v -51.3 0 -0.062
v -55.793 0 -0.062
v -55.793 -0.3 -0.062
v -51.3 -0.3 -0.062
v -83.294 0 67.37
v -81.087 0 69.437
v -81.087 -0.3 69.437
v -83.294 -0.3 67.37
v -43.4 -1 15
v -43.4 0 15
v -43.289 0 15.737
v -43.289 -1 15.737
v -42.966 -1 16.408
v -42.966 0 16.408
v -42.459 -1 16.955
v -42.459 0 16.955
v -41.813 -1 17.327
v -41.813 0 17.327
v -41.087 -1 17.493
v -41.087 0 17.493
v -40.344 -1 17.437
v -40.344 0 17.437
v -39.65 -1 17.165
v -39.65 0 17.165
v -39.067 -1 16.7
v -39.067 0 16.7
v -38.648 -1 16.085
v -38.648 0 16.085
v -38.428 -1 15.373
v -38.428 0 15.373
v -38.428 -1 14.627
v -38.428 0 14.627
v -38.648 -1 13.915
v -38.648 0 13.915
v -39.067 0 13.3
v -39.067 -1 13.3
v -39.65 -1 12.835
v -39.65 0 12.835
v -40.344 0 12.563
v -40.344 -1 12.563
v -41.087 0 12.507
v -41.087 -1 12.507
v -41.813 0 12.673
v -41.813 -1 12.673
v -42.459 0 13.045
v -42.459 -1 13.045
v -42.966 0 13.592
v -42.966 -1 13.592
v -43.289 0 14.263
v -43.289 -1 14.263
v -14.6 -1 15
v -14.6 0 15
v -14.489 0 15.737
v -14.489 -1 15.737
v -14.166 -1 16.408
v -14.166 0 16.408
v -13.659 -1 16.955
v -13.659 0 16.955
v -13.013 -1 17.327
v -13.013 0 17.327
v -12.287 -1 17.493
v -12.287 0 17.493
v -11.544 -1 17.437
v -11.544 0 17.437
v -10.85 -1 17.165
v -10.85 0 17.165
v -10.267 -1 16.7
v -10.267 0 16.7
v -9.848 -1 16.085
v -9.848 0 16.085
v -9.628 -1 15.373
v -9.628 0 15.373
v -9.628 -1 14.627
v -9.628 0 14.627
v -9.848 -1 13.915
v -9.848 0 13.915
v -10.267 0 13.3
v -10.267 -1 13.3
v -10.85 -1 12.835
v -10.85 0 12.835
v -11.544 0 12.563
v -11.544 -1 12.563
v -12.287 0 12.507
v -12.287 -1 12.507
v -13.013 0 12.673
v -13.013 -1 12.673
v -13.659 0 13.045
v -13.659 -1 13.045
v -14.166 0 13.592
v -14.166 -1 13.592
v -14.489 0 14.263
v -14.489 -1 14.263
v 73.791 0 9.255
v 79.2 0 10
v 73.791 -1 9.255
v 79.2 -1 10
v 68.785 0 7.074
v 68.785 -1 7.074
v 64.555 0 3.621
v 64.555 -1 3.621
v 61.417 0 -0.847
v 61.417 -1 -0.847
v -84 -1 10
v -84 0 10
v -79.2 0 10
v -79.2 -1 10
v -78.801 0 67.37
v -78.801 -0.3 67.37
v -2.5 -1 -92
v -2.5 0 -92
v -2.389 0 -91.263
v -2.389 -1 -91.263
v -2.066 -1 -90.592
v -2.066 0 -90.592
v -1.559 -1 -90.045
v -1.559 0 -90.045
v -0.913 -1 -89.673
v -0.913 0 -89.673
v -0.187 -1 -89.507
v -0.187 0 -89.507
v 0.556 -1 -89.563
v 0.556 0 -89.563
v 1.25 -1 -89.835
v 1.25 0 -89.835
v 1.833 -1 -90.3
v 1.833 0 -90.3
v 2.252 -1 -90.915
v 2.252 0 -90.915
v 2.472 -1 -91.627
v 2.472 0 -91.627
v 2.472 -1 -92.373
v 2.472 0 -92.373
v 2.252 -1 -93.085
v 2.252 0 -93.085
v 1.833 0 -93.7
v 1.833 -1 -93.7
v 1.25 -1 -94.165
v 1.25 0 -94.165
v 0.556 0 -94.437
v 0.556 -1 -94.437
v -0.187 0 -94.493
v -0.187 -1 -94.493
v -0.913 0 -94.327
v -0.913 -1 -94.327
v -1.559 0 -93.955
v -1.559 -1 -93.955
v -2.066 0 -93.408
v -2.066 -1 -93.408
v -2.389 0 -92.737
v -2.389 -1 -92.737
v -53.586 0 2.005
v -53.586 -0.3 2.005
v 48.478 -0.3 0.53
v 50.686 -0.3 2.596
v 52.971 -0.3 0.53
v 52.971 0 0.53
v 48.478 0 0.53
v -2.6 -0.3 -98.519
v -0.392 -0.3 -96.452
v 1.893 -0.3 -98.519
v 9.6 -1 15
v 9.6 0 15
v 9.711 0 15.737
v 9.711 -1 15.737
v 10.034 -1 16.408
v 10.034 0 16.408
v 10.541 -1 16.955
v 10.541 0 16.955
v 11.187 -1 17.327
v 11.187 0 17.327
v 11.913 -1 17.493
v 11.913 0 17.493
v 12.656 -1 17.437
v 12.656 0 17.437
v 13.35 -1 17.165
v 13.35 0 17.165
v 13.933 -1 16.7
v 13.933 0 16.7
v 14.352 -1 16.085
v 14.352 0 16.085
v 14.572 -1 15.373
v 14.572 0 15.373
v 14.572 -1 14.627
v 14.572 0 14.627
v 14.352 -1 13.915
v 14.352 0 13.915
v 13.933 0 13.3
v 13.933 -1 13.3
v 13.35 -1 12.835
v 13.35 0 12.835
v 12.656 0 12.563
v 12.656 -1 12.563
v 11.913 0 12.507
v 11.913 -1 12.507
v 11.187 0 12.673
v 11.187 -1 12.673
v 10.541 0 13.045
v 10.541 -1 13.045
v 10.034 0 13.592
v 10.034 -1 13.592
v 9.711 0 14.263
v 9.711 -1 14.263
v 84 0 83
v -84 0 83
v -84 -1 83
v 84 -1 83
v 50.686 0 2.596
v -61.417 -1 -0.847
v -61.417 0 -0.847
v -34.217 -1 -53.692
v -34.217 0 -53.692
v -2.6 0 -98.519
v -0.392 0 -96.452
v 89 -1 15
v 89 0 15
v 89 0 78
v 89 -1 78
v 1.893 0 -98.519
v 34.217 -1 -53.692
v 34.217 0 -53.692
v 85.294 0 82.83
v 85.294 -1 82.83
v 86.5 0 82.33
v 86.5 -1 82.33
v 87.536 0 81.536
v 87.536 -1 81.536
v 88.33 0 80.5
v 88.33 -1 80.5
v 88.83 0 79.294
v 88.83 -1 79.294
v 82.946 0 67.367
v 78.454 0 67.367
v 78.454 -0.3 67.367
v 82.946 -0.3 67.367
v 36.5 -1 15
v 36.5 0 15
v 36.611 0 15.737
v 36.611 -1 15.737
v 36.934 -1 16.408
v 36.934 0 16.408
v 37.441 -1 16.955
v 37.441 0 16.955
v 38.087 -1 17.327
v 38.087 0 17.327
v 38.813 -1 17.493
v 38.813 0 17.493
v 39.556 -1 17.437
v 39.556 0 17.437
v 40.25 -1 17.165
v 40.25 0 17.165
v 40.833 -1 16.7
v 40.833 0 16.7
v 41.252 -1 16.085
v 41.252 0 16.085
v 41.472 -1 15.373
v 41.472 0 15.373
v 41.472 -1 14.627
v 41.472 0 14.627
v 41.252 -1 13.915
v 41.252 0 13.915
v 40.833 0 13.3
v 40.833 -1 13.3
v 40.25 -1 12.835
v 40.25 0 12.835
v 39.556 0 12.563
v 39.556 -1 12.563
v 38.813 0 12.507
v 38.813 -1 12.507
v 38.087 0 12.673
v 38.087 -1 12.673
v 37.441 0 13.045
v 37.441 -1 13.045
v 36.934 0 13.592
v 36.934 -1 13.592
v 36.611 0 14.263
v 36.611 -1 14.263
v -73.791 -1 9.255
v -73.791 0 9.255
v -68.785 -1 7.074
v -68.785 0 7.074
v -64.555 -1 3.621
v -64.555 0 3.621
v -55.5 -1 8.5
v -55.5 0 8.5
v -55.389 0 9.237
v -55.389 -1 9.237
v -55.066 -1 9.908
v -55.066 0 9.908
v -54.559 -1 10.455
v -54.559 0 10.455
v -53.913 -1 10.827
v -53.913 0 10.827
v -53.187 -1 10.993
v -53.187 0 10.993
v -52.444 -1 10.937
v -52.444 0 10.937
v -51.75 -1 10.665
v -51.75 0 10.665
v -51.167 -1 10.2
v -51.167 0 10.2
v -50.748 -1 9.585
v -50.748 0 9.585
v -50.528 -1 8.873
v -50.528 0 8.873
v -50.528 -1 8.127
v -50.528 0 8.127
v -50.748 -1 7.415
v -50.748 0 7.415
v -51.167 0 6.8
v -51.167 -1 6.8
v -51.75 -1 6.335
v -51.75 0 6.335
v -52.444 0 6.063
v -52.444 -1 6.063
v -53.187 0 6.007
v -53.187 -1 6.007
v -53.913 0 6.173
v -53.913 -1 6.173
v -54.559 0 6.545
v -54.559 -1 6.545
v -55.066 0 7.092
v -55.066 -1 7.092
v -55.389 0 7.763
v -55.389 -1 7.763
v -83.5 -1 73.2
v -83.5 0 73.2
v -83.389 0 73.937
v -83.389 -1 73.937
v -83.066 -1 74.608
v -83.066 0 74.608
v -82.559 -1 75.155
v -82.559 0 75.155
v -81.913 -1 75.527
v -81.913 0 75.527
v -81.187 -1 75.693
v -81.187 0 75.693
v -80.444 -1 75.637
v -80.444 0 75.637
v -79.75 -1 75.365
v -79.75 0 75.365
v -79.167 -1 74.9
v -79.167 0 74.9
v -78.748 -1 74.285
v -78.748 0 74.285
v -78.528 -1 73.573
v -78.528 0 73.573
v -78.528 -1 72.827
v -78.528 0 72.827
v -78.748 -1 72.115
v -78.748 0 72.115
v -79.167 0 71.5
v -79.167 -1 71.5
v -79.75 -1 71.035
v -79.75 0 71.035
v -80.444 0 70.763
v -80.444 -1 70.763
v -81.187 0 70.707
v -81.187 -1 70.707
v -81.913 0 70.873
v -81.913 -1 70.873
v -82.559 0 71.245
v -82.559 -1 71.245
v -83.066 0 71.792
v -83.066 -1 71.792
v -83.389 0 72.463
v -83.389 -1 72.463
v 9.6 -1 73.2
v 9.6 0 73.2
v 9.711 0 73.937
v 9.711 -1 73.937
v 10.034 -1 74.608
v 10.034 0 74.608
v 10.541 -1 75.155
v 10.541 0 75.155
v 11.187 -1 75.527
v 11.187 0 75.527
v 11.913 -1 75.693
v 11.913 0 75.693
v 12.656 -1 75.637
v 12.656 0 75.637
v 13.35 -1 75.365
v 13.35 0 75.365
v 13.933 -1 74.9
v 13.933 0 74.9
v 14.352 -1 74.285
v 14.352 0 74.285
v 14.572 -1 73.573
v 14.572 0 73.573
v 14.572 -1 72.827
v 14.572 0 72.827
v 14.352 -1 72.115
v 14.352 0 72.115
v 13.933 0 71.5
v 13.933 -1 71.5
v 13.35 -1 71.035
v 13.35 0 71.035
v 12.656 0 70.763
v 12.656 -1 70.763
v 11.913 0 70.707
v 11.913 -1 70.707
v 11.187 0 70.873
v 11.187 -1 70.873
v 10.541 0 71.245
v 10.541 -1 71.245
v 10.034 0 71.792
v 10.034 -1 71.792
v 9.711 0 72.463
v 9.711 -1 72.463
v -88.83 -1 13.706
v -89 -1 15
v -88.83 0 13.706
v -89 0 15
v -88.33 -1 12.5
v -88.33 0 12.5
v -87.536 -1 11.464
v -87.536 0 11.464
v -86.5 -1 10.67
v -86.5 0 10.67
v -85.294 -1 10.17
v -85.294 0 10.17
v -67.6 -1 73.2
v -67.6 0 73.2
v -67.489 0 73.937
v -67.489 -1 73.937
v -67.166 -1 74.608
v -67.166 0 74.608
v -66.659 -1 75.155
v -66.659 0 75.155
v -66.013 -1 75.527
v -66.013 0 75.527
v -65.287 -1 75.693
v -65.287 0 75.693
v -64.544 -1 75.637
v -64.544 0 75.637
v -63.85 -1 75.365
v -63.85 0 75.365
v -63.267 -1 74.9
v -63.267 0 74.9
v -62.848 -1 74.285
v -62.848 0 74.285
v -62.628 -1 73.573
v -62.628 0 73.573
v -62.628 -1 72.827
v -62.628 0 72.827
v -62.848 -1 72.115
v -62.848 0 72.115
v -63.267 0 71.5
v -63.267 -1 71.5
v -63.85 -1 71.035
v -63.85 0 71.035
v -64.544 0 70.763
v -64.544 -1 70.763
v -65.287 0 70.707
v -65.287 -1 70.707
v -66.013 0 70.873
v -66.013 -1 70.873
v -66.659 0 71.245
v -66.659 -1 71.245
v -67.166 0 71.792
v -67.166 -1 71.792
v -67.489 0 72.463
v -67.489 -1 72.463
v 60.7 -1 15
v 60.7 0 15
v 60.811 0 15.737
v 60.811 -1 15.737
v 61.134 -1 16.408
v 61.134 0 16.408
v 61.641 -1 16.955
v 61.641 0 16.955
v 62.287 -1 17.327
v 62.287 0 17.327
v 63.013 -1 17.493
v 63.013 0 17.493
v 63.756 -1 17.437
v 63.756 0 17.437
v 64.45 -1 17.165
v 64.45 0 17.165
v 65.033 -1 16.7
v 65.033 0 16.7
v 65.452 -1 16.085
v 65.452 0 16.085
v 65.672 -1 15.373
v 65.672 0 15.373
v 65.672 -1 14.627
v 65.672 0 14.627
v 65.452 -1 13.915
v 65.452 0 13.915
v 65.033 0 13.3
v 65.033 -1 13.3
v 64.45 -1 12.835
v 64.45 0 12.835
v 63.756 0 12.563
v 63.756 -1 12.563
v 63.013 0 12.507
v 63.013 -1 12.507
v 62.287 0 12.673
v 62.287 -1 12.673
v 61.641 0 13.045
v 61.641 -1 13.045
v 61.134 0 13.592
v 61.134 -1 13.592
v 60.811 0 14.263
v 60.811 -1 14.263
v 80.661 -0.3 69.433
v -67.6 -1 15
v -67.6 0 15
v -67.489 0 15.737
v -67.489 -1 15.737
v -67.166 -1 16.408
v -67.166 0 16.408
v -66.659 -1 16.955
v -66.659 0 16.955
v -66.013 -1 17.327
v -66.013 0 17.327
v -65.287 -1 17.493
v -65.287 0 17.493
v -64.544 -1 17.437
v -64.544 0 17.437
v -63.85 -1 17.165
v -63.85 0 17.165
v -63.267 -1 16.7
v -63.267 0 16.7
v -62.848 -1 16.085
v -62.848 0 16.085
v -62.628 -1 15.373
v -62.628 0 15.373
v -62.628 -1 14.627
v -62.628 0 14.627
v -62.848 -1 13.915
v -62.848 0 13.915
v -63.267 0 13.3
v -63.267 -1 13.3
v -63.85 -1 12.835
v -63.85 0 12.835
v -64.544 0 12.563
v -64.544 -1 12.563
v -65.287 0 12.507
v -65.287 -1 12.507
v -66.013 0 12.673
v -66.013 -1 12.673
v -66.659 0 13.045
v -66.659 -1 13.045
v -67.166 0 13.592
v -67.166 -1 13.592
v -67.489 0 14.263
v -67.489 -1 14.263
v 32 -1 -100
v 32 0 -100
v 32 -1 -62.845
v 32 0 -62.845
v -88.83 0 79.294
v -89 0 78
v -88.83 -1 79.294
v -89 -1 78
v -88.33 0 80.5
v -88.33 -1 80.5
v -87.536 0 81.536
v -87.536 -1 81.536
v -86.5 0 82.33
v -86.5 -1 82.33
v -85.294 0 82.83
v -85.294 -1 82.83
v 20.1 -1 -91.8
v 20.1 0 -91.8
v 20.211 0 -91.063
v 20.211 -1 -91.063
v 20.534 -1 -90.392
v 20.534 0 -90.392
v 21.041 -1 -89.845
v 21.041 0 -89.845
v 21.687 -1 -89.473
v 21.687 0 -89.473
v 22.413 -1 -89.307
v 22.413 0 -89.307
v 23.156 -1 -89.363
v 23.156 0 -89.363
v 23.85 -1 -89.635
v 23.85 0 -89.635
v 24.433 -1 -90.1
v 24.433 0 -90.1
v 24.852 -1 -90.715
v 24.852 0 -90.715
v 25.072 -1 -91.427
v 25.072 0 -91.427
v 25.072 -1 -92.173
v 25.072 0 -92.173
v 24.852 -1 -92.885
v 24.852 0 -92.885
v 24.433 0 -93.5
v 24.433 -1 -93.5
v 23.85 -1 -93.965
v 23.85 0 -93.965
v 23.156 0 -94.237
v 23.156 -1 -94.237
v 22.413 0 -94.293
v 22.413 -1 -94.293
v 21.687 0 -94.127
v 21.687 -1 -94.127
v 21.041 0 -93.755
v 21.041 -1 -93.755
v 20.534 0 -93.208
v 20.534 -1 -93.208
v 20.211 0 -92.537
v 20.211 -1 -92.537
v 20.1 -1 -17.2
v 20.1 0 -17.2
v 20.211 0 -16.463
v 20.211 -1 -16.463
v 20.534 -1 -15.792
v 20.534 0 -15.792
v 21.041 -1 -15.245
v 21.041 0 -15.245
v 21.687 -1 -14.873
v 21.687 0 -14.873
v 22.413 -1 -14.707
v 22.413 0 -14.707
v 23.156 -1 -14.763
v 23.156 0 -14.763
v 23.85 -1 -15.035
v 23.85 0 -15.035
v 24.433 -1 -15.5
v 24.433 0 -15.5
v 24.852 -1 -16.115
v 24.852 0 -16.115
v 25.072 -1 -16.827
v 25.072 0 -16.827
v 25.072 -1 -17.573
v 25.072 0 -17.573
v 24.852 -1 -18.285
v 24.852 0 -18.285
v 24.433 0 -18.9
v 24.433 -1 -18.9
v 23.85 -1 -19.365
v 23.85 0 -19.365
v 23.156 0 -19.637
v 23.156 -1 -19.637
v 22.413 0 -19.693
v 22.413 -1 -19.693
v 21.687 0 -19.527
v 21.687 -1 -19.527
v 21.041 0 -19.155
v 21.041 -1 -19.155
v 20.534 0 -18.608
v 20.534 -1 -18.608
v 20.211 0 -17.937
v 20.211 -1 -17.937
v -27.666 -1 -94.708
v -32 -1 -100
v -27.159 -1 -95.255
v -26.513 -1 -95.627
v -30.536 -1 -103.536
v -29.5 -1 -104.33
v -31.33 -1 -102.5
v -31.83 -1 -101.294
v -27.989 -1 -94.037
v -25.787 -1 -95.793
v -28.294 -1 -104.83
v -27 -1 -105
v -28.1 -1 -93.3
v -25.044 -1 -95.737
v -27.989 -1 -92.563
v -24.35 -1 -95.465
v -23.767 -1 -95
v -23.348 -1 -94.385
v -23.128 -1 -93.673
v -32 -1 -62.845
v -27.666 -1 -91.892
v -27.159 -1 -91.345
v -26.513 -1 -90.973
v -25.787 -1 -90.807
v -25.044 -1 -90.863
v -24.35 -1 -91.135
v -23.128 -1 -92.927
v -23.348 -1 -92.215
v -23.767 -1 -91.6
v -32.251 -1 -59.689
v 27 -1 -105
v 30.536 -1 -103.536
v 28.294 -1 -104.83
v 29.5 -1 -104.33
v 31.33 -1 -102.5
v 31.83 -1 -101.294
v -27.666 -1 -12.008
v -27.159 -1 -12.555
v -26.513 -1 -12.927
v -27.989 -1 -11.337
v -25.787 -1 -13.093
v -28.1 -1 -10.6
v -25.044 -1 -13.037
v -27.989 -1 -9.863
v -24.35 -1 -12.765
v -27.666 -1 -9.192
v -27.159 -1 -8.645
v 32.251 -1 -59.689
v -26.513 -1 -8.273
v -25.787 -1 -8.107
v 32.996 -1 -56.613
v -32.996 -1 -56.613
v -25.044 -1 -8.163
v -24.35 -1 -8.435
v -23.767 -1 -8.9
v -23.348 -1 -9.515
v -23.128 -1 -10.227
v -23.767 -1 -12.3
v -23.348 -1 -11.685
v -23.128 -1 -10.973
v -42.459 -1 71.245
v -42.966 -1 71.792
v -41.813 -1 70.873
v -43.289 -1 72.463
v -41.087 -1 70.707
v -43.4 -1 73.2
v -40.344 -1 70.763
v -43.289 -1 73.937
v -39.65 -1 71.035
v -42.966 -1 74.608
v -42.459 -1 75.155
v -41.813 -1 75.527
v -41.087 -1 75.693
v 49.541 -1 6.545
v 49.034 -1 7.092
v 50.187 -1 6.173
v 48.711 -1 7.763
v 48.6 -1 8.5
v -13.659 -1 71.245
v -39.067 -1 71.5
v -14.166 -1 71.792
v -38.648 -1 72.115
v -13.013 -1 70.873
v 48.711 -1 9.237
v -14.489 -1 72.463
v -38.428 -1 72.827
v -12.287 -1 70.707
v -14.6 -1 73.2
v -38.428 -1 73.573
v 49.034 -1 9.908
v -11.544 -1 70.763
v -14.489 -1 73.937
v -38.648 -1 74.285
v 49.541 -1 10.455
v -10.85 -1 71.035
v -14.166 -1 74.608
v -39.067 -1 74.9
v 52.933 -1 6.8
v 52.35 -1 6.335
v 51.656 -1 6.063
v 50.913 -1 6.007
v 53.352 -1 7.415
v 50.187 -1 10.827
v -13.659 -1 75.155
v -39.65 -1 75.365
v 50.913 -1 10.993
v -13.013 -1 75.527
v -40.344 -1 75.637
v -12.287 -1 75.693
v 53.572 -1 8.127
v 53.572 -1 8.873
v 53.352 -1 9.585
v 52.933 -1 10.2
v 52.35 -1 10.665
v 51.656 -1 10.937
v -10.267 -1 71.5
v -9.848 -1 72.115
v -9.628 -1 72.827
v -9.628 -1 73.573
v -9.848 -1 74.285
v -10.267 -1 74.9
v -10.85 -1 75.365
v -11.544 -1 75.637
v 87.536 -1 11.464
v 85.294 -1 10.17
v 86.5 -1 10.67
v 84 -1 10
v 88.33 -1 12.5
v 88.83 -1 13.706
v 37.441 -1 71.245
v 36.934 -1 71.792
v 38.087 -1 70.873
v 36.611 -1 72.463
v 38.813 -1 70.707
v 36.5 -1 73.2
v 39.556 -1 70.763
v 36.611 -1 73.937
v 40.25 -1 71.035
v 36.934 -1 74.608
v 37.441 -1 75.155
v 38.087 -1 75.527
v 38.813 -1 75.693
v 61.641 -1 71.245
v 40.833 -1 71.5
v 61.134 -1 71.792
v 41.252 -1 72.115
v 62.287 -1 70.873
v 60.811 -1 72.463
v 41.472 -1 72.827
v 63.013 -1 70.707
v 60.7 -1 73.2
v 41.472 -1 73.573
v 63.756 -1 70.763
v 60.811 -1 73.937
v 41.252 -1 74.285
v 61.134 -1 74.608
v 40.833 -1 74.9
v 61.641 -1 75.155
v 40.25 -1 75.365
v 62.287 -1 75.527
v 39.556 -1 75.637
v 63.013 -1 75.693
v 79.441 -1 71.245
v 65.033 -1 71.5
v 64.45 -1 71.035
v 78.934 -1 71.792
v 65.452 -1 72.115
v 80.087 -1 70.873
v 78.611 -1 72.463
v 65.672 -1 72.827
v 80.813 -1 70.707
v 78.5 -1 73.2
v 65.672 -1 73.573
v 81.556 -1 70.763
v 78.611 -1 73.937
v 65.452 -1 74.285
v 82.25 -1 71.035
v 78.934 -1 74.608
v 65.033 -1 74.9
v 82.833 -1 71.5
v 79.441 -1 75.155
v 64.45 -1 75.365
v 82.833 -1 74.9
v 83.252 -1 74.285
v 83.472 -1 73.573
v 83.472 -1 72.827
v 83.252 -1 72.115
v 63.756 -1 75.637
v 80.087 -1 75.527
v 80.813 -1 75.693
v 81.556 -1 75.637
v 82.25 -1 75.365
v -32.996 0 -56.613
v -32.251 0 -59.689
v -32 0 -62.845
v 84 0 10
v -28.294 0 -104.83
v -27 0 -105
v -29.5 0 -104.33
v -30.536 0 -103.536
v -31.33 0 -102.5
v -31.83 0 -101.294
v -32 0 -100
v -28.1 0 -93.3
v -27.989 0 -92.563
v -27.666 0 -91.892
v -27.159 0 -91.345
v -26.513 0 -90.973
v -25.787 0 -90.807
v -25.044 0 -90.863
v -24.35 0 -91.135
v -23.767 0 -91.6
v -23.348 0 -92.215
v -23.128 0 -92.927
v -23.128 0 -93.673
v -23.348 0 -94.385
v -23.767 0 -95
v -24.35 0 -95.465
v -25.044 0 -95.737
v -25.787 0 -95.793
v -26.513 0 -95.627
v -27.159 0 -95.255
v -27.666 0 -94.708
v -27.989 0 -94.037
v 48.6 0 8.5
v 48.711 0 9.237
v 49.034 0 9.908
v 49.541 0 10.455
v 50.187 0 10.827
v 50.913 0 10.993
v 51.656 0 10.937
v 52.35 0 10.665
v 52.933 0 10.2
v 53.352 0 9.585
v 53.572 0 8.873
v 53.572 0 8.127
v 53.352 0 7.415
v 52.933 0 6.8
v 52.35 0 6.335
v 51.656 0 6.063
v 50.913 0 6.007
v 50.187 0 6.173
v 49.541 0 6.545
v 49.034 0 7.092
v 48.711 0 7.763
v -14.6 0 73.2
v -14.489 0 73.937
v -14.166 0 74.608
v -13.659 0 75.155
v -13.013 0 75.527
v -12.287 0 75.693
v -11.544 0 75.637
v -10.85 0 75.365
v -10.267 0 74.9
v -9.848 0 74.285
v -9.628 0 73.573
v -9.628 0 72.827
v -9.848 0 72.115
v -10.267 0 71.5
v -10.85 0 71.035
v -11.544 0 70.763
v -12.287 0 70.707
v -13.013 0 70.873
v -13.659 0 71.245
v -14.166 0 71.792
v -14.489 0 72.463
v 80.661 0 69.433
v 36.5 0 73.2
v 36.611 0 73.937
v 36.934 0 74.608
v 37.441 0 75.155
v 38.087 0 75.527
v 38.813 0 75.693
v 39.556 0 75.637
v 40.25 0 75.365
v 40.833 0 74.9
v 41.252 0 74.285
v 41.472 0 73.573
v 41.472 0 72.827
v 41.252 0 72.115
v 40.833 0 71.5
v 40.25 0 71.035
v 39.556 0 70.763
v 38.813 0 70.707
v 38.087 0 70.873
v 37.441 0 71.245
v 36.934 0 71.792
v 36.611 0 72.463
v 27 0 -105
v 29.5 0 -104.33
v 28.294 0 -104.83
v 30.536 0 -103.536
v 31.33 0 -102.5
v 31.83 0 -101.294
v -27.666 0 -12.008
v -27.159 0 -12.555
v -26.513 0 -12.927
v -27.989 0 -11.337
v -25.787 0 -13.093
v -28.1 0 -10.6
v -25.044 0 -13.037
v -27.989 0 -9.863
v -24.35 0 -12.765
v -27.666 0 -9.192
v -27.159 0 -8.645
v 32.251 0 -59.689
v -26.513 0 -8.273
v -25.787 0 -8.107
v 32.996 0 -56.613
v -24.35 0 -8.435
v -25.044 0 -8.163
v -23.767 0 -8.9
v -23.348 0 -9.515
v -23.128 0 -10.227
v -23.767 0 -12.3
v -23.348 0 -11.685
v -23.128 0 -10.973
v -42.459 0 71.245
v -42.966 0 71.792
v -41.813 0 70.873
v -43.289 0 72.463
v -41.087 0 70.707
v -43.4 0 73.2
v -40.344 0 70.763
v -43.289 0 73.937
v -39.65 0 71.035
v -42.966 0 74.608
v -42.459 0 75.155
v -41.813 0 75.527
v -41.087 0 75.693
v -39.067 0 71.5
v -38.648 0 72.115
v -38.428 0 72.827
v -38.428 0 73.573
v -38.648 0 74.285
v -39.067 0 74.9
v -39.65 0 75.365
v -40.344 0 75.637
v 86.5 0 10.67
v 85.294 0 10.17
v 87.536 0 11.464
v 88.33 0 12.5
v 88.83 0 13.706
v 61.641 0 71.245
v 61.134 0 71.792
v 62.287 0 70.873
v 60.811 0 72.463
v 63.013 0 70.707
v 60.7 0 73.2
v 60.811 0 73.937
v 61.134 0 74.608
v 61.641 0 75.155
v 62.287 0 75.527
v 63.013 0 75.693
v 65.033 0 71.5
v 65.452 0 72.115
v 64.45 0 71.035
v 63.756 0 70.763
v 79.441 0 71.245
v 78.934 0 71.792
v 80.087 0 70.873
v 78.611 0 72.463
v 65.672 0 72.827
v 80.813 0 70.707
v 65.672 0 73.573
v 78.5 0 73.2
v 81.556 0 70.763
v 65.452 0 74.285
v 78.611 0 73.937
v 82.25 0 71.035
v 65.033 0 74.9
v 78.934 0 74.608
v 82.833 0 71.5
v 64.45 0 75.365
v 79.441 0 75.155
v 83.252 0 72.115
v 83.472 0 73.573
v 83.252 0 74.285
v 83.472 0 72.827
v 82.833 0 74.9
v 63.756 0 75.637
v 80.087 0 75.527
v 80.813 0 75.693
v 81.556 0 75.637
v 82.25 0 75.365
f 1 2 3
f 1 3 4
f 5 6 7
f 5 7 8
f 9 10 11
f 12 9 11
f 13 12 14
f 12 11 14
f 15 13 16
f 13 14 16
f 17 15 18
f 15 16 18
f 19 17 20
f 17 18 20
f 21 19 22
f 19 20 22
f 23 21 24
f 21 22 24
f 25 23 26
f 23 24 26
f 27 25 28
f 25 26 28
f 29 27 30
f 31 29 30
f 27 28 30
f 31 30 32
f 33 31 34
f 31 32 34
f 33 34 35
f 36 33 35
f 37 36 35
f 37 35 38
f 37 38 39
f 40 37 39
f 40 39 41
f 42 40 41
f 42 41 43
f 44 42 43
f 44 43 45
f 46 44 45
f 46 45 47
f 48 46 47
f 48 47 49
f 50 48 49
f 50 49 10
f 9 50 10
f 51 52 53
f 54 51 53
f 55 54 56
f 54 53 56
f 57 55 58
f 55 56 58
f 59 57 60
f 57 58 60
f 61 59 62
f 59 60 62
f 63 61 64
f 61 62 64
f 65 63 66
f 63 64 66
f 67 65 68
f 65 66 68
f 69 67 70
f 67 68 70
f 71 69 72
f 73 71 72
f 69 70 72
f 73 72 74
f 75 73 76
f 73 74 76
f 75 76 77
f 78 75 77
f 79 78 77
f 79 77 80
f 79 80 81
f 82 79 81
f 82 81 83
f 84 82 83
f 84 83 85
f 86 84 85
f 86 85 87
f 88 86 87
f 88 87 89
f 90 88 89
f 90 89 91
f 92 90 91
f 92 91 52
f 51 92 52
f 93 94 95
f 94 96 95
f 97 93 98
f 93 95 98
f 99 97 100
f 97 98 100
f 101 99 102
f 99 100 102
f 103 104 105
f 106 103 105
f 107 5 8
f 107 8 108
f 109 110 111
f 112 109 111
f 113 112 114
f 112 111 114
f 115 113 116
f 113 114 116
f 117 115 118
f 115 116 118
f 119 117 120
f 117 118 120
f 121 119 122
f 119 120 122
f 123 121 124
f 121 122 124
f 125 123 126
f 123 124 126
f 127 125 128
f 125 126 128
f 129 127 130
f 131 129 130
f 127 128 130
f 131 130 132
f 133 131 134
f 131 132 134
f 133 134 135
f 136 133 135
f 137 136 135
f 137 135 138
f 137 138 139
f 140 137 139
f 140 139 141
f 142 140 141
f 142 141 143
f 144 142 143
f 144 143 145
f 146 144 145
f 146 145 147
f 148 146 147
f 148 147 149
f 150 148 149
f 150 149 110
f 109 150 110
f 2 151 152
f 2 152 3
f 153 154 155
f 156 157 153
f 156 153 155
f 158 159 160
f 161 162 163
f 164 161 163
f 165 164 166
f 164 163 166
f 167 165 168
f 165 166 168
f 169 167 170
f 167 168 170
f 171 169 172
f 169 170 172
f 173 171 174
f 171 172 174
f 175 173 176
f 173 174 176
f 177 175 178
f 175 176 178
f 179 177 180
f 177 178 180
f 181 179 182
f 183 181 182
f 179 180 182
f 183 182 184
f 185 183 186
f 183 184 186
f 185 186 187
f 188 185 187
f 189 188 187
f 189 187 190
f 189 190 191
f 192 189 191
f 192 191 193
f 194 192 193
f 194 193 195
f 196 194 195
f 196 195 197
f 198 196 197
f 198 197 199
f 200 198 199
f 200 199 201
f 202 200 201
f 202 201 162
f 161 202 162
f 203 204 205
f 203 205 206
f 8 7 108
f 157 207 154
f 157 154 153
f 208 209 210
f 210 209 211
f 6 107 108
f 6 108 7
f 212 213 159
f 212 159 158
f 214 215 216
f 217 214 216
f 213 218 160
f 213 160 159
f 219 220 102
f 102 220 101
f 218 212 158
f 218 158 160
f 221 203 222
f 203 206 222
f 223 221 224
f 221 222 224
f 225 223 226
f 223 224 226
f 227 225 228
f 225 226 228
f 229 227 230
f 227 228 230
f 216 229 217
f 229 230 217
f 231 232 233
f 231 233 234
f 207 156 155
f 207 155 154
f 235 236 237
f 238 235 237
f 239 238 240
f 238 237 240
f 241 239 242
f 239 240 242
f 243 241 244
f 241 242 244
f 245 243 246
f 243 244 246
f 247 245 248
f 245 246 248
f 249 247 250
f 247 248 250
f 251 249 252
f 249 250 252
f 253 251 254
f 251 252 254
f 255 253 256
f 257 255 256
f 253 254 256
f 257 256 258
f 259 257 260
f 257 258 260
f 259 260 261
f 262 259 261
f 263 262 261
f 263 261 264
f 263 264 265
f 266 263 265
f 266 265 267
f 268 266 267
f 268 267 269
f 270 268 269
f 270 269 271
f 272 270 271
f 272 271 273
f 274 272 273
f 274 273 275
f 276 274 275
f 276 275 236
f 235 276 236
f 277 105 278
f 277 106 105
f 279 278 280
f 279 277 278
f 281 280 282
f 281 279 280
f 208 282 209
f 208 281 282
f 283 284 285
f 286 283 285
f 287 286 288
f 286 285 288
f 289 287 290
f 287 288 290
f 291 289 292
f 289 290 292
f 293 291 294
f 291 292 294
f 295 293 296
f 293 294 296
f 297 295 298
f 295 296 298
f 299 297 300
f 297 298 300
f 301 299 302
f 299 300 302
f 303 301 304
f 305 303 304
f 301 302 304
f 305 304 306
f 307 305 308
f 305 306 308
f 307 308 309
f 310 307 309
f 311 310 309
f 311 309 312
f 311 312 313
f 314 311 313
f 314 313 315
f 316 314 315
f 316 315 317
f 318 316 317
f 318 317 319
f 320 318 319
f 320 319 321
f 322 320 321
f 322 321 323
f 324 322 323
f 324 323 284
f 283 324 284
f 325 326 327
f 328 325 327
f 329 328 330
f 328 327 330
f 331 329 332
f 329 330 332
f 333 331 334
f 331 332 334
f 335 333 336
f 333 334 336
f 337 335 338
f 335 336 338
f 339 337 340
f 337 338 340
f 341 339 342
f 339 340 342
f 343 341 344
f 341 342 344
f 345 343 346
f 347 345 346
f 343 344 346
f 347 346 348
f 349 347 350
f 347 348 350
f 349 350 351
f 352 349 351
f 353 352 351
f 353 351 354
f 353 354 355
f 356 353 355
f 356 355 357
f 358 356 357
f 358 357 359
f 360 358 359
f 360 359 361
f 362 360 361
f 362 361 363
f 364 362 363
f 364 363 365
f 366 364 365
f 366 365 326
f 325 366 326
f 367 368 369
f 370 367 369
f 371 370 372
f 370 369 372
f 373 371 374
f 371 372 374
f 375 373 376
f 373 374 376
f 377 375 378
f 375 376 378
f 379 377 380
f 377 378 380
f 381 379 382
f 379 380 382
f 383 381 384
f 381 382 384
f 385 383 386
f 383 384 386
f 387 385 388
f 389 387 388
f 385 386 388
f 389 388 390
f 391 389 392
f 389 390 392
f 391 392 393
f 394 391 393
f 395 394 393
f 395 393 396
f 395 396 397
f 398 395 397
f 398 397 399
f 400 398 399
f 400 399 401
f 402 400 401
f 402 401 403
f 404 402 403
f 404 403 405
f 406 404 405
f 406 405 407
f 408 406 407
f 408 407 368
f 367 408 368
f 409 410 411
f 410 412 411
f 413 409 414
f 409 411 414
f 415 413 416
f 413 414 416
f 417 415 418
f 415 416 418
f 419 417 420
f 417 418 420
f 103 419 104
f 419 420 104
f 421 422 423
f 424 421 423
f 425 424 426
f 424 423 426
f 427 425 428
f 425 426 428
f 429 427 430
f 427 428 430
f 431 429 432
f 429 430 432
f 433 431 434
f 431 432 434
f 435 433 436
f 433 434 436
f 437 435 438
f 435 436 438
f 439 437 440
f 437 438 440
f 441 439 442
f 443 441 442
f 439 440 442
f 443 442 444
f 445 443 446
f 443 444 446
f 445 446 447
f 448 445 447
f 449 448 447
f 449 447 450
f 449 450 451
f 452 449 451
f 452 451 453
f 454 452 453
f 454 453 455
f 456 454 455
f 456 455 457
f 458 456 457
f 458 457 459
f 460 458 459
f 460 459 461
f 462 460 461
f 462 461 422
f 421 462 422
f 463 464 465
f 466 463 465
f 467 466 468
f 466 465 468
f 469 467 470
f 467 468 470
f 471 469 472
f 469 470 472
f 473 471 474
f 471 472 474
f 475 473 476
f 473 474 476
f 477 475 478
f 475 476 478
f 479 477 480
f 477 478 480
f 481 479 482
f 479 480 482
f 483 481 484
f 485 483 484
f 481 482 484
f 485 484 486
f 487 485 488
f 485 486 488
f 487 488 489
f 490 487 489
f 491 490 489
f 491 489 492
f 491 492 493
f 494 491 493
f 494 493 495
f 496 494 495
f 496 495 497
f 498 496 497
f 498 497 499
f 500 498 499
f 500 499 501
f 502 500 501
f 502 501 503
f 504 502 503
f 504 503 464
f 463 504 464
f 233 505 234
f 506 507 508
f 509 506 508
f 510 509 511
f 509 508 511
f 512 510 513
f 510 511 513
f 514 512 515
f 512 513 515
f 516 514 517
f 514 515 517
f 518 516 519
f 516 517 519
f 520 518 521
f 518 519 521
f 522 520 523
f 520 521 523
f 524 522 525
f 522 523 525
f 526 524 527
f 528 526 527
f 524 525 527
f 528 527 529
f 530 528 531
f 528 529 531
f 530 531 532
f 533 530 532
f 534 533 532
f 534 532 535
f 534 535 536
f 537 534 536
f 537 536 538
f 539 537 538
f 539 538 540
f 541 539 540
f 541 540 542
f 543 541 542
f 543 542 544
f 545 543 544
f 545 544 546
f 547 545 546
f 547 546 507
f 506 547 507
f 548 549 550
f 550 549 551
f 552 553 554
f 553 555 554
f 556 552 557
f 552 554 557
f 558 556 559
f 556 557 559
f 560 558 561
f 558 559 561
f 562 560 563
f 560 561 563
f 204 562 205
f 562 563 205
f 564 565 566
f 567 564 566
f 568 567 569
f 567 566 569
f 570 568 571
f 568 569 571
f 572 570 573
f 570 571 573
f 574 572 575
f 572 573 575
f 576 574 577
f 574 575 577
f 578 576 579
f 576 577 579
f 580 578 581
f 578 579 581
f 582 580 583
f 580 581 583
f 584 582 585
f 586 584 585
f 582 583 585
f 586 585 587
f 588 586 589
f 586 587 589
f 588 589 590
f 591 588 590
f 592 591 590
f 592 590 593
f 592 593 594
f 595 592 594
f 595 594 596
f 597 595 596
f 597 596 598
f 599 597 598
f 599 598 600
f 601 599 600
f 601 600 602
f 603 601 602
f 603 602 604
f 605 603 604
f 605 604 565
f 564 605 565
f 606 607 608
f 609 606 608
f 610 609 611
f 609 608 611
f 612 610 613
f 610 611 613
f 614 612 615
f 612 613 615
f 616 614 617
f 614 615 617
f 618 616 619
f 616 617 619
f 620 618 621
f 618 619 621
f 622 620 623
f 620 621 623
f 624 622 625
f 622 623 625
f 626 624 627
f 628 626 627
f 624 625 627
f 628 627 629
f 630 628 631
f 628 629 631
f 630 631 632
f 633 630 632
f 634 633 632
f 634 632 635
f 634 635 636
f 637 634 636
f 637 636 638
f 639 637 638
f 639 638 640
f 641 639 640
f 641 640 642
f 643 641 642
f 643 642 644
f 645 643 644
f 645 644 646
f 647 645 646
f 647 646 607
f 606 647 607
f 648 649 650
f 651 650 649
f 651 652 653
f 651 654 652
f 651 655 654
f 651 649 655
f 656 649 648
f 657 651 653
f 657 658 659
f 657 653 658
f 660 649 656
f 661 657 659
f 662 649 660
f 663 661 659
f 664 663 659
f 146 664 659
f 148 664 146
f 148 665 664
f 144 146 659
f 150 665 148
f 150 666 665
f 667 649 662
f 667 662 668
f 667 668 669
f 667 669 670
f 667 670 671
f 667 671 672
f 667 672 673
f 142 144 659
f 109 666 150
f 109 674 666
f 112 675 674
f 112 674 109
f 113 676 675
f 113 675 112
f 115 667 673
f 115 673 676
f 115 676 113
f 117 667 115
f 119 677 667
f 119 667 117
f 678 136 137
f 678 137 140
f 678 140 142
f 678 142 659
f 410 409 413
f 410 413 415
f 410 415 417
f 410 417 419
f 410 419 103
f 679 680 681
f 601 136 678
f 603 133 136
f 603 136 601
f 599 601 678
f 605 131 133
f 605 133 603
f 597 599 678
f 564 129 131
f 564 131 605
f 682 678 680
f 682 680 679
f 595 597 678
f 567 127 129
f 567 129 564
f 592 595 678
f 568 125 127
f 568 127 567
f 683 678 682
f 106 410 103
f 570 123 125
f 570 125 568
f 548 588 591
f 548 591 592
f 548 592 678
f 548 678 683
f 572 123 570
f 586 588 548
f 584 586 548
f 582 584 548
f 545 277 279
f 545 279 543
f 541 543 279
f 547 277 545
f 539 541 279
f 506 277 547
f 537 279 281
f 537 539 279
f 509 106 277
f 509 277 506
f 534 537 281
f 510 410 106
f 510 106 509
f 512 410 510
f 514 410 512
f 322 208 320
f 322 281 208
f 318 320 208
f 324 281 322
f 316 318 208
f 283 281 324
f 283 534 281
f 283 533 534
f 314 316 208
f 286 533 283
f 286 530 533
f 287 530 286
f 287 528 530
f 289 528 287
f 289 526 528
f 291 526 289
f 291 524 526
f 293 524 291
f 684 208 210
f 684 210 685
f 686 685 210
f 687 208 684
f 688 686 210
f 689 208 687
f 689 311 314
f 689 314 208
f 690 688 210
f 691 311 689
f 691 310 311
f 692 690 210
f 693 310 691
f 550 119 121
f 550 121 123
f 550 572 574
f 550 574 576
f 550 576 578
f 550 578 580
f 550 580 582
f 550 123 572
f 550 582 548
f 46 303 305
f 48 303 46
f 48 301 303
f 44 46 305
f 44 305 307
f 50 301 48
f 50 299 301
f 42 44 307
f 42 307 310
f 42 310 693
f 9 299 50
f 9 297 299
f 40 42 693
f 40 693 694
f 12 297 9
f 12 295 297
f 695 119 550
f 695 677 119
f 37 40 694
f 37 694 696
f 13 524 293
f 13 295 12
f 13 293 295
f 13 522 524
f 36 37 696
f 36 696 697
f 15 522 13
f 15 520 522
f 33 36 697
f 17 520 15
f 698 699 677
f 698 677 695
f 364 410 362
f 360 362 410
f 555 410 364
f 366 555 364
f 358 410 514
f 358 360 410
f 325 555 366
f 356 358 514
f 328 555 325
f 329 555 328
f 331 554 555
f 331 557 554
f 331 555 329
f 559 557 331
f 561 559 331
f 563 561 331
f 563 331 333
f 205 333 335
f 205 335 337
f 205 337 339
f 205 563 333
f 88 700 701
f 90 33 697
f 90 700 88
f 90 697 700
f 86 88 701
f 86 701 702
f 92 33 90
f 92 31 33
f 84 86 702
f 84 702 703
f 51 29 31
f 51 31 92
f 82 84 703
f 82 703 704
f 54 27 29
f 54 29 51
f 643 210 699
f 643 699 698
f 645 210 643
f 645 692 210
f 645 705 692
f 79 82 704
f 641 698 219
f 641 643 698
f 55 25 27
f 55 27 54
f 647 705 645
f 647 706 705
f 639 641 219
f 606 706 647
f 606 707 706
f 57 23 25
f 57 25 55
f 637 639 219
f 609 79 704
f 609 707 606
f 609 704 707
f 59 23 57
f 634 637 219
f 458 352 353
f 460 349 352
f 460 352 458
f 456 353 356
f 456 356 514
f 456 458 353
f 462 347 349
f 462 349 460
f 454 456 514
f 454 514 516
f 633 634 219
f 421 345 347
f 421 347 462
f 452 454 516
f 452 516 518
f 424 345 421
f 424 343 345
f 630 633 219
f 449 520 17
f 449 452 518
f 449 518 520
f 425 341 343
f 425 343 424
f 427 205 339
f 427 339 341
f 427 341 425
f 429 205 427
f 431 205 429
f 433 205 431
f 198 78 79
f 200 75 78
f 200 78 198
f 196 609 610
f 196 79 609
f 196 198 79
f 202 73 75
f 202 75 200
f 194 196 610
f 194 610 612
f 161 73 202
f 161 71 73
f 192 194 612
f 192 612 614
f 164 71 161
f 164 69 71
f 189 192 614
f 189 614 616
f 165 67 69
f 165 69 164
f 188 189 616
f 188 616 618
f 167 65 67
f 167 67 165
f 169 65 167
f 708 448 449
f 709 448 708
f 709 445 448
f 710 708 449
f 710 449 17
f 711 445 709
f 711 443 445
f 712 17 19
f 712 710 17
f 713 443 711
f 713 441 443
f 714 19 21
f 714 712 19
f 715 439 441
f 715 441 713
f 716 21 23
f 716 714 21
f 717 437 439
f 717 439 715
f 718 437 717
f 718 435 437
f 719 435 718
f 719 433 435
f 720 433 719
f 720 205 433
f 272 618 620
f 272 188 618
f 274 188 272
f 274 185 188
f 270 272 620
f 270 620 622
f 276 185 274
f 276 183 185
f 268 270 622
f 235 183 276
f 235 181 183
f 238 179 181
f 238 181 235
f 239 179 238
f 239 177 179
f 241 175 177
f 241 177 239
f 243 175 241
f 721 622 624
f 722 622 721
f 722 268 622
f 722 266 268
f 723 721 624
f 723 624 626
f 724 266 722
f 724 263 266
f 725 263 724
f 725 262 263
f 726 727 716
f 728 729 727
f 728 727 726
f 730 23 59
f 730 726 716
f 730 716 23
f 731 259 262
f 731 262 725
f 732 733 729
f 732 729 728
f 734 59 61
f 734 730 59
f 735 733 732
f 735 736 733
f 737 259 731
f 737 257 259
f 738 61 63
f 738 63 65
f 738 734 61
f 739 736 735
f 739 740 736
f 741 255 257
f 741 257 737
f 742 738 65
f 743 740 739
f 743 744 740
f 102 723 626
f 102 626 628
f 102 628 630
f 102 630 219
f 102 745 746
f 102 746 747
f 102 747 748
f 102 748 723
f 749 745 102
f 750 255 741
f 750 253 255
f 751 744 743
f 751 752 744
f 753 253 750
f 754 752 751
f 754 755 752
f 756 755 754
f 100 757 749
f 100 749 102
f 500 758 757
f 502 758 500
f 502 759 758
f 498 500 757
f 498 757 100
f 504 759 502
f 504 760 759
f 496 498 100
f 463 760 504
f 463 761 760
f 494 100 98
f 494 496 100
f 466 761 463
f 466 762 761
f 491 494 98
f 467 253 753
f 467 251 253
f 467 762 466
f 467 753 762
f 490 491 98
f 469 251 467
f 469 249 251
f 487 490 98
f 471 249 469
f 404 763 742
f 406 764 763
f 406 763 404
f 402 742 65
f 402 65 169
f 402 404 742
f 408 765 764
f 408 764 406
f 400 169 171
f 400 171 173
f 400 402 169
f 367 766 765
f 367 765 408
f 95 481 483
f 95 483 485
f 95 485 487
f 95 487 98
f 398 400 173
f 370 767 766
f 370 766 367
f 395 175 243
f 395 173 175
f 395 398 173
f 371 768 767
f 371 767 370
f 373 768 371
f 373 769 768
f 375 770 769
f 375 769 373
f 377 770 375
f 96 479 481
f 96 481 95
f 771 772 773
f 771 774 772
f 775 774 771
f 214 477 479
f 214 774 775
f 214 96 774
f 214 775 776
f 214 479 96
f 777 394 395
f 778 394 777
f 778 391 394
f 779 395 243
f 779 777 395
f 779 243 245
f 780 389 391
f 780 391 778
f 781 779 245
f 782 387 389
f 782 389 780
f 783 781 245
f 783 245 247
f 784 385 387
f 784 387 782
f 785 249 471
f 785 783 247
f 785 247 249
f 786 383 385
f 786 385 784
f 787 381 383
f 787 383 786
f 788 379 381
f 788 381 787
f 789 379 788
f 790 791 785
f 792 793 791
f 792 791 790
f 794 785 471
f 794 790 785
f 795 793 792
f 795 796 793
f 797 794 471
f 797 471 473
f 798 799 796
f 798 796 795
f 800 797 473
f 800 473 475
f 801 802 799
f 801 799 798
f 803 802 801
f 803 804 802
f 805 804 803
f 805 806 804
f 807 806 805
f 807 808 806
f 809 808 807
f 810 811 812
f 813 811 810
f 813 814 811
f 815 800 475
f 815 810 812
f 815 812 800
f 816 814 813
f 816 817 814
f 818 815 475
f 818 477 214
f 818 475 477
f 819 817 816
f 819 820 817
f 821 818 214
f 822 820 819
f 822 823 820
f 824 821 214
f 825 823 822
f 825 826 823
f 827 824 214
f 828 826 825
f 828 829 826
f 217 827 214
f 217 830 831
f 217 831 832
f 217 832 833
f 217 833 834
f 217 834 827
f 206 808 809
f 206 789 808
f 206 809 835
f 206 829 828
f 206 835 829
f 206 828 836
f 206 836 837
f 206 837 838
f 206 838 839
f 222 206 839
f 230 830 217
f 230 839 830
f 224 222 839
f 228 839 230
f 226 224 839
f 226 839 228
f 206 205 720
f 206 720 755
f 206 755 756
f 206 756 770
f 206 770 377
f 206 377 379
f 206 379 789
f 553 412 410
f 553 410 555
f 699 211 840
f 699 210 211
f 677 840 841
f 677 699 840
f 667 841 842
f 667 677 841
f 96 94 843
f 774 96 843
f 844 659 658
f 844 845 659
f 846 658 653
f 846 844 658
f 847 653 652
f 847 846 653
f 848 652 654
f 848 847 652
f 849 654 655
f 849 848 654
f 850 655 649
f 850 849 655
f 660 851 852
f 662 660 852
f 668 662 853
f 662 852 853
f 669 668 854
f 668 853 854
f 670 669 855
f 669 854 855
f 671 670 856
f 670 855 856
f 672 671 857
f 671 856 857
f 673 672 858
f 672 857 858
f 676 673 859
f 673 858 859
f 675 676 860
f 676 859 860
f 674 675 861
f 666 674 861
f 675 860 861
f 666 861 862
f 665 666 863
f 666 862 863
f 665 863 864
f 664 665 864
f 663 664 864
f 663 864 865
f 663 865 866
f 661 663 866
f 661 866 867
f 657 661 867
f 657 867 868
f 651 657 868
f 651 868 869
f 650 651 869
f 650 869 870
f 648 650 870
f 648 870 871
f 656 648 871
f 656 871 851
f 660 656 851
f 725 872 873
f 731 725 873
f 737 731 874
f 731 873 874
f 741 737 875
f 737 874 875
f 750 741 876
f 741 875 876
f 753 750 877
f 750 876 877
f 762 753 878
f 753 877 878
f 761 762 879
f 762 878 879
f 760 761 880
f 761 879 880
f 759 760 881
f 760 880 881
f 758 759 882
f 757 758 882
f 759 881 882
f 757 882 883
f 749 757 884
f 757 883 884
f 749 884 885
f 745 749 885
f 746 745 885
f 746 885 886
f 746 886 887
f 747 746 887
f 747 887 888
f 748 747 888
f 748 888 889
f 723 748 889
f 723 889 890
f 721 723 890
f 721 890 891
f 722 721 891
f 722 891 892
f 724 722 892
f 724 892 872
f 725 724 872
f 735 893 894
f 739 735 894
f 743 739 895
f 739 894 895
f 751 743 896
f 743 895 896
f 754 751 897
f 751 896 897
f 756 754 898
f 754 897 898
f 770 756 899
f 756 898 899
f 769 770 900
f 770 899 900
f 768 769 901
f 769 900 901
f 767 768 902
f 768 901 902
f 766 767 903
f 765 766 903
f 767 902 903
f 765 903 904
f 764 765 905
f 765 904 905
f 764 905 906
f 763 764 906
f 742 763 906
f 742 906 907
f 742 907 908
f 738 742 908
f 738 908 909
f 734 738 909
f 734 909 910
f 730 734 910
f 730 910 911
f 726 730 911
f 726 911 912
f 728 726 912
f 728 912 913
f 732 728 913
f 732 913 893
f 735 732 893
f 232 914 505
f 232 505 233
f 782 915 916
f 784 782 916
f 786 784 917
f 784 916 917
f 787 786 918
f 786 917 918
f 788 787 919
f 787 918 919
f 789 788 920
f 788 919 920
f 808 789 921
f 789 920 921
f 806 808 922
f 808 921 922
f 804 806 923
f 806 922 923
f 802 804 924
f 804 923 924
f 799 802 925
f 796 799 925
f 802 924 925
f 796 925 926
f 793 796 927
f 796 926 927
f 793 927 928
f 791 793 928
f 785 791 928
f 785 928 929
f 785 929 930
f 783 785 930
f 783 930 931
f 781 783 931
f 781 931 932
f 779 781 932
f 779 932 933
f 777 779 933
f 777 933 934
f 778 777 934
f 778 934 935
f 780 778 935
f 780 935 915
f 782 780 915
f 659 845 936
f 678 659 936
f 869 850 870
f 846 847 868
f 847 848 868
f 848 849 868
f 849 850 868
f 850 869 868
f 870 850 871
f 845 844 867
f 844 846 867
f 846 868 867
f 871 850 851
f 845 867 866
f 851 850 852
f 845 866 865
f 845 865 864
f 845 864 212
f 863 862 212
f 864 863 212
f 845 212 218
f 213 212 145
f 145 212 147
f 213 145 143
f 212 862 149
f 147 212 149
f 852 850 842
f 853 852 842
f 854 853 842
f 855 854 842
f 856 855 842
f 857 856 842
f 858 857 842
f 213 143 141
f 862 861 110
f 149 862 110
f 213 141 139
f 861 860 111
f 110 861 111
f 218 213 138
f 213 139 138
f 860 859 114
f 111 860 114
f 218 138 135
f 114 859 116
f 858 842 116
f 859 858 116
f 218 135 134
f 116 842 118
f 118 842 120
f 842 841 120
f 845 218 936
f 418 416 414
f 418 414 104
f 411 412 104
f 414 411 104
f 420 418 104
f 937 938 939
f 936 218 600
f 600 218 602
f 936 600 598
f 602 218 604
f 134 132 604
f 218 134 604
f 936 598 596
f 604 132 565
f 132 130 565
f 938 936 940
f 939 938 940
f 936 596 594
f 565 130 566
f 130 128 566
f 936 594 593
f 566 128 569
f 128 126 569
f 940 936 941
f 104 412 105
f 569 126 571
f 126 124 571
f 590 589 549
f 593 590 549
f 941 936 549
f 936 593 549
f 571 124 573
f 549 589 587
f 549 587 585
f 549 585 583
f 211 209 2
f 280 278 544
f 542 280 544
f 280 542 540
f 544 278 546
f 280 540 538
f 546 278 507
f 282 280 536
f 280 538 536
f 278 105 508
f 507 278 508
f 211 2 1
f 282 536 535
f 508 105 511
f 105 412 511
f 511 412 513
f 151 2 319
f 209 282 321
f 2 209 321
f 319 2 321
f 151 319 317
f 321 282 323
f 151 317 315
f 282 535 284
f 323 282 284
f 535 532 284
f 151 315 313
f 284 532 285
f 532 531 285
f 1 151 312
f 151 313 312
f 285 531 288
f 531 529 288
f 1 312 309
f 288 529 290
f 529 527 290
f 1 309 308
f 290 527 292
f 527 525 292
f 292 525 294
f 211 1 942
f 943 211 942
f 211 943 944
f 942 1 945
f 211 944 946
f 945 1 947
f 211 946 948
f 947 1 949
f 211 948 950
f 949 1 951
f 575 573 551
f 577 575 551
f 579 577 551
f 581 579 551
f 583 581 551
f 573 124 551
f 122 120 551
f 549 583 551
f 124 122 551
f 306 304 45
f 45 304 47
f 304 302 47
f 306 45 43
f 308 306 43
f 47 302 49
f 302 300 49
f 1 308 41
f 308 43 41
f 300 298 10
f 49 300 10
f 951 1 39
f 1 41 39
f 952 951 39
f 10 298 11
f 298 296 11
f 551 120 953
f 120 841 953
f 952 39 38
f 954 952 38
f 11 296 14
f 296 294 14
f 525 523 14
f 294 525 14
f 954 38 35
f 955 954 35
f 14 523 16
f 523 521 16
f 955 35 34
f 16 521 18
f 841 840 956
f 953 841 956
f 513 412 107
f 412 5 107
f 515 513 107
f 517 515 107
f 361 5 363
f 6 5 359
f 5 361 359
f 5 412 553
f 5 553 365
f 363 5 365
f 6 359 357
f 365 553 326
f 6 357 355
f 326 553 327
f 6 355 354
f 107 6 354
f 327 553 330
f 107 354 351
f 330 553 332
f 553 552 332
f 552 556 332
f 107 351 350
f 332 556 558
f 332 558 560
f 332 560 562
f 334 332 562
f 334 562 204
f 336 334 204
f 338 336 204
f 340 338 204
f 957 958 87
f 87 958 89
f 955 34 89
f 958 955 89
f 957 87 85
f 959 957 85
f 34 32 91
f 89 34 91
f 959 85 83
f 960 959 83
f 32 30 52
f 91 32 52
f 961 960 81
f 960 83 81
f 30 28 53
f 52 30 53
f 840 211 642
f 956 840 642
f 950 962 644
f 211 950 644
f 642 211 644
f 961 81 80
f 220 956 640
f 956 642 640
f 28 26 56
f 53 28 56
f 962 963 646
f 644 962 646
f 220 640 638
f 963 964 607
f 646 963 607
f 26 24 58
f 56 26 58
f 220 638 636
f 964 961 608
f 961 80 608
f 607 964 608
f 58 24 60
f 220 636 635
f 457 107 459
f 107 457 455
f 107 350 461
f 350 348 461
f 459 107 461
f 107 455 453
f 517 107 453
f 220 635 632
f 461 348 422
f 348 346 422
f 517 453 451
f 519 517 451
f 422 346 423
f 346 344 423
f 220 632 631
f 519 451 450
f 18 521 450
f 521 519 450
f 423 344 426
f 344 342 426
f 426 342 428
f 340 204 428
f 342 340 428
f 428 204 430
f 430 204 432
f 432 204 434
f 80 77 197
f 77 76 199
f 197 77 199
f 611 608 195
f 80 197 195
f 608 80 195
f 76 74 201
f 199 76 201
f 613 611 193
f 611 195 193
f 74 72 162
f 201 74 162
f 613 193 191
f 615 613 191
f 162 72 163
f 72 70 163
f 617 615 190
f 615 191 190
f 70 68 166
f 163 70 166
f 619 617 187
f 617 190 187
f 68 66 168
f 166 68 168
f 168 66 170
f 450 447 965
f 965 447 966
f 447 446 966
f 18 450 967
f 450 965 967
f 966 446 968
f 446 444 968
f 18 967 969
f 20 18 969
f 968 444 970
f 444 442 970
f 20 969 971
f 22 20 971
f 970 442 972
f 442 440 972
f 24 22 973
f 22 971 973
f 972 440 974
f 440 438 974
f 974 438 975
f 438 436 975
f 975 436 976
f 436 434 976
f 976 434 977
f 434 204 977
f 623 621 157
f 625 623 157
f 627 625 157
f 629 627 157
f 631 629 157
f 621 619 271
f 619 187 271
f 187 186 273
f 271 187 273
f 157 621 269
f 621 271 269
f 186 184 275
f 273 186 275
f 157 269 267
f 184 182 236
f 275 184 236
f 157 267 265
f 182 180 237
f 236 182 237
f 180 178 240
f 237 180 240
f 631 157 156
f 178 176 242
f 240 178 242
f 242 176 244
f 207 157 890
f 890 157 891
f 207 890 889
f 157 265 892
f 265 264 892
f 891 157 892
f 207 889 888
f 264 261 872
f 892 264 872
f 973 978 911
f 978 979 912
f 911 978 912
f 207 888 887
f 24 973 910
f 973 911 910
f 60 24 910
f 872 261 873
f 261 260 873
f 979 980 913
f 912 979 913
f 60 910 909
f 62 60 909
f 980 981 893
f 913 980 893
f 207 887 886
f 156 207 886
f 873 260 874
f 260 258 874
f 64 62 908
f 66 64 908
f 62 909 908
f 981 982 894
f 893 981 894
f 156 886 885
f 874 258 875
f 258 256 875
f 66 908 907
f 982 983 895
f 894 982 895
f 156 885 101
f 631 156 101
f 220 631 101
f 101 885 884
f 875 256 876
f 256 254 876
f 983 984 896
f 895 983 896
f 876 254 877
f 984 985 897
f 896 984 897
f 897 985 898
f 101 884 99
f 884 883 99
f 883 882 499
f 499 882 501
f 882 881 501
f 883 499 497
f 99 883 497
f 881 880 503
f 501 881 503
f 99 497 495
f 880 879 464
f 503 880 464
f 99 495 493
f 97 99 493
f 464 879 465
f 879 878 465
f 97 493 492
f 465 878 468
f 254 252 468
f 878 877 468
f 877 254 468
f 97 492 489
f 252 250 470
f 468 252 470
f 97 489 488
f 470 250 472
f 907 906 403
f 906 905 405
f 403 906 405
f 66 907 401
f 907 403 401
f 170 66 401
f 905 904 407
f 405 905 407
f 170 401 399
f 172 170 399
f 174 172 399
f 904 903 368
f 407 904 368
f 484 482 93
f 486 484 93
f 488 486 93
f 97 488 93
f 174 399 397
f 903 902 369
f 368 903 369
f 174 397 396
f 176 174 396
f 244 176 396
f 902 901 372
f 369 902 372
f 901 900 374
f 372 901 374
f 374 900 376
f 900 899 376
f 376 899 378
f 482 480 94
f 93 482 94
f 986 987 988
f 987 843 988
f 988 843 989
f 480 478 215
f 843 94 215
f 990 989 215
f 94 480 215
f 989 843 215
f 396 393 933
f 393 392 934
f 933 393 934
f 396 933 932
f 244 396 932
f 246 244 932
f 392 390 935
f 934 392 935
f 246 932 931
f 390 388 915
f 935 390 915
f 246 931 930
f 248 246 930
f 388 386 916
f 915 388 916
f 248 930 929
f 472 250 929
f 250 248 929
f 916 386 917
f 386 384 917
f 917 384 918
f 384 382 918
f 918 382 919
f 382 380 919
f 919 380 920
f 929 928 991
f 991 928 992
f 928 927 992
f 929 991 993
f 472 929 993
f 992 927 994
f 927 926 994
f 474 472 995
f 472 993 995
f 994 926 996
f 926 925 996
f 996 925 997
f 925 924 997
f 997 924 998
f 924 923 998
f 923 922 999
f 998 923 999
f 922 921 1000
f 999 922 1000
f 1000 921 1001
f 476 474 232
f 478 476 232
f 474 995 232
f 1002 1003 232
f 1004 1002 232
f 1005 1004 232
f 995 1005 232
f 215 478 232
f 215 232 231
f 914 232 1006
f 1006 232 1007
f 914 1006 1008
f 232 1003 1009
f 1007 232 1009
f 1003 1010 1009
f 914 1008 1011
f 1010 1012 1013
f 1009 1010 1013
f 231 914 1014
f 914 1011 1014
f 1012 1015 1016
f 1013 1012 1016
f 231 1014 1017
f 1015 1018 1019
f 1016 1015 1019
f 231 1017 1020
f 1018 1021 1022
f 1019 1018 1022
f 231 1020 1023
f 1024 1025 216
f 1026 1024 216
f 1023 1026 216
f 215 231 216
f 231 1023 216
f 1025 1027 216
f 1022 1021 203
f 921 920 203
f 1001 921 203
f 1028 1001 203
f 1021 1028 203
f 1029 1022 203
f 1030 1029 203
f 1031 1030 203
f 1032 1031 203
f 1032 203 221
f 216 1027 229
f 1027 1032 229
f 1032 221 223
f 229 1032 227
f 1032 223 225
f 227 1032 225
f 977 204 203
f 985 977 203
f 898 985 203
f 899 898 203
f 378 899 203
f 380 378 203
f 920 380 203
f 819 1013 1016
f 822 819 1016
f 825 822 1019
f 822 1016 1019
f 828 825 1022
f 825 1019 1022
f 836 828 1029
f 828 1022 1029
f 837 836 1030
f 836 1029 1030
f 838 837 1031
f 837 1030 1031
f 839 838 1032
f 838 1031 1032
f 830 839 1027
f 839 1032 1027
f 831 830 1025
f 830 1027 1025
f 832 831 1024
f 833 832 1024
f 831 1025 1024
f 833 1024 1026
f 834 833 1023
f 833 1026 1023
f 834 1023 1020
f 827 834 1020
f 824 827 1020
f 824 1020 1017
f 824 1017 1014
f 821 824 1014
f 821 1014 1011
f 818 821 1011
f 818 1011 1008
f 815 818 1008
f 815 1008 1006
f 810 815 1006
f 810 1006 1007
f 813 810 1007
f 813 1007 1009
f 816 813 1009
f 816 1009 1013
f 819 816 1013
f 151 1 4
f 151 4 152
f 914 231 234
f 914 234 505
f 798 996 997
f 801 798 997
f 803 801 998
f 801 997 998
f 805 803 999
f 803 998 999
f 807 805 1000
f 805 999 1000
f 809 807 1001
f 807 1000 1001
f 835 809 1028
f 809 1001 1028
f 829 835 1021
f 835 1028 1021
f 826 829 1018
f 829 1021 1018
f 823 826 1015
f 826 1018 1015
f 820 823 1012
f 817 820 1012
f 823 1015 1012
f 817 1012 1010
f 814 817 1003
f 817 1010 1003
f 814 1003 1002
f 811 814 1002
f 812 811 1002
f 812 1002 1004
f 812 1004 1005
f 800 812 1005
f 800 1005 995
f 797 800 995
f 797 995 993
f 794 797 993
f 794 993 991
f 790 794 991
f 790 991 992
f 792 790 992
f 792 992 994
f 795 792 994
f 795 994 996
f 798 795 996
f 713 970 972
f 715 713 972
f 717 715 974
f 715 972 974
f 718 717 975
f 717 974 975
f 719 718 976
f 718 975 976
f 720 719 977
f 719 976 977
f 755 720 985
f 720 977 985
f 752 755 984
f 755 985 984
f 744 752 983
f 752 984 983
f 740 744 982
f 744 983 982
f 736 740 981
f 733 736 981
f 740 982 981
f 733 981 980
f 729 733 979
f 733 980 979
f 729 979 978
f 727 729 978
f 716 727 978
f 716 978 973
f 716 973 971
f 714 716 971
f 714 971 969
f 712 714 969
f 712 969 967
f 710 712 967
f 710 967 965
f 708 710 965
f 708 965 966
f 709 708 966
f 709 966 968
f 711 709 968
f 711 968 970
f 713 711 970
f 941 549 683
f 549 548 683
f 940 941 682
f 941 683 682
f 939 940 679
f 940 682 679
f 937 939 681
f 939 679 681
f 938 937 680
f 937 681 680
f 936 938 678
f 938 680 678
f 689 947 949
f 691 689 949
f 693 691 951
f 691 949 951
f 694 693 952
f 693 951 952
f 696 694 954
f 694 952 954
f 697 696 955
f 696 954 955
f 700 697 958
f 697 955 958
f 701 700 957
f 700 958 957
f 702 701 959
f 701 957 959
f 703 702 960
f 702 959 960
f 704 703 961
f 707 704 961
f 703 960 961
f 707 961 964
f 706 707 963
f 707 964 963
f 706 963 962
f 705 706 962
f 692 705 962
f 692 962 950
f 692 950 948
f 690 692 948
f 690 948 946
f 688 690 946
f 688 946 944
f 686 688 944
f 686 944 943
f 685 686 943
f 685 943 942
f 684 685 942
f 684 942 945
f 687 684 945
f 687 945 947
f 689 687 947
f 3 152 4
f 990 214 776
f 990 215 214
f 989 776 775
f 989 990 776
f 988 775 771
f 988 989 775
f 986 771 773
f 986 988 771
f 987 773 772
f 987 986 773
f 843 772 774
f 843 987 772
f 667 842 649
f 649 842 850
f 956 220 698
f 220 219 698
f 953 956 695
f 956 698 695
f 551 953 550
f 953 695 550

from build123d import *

# Parameters (mm, degrees)
F0_W     = 178
F0_H     = 188
F1_DEPTH = 1
F2_R     = 2.5
F3_DEPTH = 1.001
F5_DEPTH = 1.001
F6_R     = 5
F7_R     = 20
F9_DEPTH = 0.3


with BuildPart() as f1:
    # F0 (on Front) → F1 (new body)
    with BuildSketch(Plane.XZ):
        with Locations((0, -11)):
            Rectangle(F0_W, F0_H)
    extrude(amount=F1_DEPTH)

    # F2 (on face) → F3 (cut, through all)
    with BuildSketch(Plane(origin=(0, 0, 0), x_dir=(-1, 0, 0), z_dir=(0, 1, 0))):
        with Locations((-81, 73.2)):
            Circle(F2_R)
        with Locations((81, 73.2)):
            Circle(F2_R)
        with Locations((53, 8.5)):
            Circle(F2_R)
        with Locations((-51.1, 8.5)):
            Circle(F2_R)
        with Locations((0, -92)):
            Circle(F2_R)
        with Locations((-22.6, -91.8)):
            Circle(F2_R)
        with Locations((25.6, -93.3)):
            Circle(F2_R)
        with Locations((-22.6, -17.2)):
            Circle(F2_R)
        with Locations((25.6, -10.6)):
            Circle(F2_R)
        with Locations((-63.2, 73.2)):
            Circle(F2_R)
        with Locations((-39, 73.2)):
            Circle(F2_R)
        with Locations((-39, 15)):
            Circle(F2_R)
        with Locations((-63.2, 15)):
            Circle(F2_R)
        with Locations((40.9, 73.2)):
            Circle(F2_R)
        with Locations((65.1, 73.2)):
            Circle(F2_R)
        with Locations((65.1, 15)):
            Circle(F2_R)
        with Locations((40.9, 15)):
            Circle(F2_R)
        with Locations((-12.1, 73.2)):
            Circle(F2_R)
        with Locations((12.1, 73.2)):
            Circle(F2_R)
        with Locations((-12.1, 15)):
            Circle(F2_R)
        with Locations((12.1, 15)):
            Circle(F2_R)
    extrude(amount=-F3_DEPTH, mode=Mode.SUBTRACT)

    # F4 (on face) → F5 (cut, through all)
    with BuildSketch(Plane(origin=(0, 0, 0), x_dir=(-1, 0, 0), z_dir=(0, 1, 0))):
        Polygon((-94, -113), (-32, -113), (-32, -58), (-67, 10), (-94, 10), align=None)
        Polygon((32, -58), (32, -113), (94, -113), (94, 10), (67, 10), align=None)
    extrude(amount=-F5_DEPTH, mode=Mode.SUBTRACT)

    # F6
    f6_edges = [f1.edges().sort_by_distance(p)[0] for p in [
        (89, -0.5, 83),
        (-89, -0.5, 83),
        (-89, -0.5, 10),
        (-32, -0.5, -105),
        (32, -0.5, -105),
        (89, -0.5, 10),
    ]]
    fillet(f6_edges, radius=F6_R)

    # F7
    f7_edges = [f1.edges().sort_by_distance(p)[0] for p in [
        (67, -0.5, 10),
        (32, -0.5, -58),
        (-32, -0.5, -58),
        (-67, -0.5, 10),
    ]]
    fillet(f7_edges, radius=F7_R)

    # F8 (on face) → F9 (cut)
    with BuildSketch(Plane.XZ):
        Polygon((82.946427, 67.366861), (80.661148, 69.433466), (78.453593, 67.366861), align=None)
        Polygon((52.970854, 0.529755), (50.685575, 2.59636), (48.47802, 0.529755), align=None)
        Polygon((-51.300323, -0.06174), (-53.585603, 2.004865), (-55.793157, -0.06174), align=None)
        Polygon((1.892914, -98.51862), (-0.392365, -96.452015), (-2.59992, -98.51862), align=None)
        Polygon((-78.801448, 67.370405), (-81.086727, 69.43701), (-83.294282, 67.370405), align=None)
    extrude(amount=F9_DEPTH, mode=Mode.SUBTRACT)


solid = f1.part
